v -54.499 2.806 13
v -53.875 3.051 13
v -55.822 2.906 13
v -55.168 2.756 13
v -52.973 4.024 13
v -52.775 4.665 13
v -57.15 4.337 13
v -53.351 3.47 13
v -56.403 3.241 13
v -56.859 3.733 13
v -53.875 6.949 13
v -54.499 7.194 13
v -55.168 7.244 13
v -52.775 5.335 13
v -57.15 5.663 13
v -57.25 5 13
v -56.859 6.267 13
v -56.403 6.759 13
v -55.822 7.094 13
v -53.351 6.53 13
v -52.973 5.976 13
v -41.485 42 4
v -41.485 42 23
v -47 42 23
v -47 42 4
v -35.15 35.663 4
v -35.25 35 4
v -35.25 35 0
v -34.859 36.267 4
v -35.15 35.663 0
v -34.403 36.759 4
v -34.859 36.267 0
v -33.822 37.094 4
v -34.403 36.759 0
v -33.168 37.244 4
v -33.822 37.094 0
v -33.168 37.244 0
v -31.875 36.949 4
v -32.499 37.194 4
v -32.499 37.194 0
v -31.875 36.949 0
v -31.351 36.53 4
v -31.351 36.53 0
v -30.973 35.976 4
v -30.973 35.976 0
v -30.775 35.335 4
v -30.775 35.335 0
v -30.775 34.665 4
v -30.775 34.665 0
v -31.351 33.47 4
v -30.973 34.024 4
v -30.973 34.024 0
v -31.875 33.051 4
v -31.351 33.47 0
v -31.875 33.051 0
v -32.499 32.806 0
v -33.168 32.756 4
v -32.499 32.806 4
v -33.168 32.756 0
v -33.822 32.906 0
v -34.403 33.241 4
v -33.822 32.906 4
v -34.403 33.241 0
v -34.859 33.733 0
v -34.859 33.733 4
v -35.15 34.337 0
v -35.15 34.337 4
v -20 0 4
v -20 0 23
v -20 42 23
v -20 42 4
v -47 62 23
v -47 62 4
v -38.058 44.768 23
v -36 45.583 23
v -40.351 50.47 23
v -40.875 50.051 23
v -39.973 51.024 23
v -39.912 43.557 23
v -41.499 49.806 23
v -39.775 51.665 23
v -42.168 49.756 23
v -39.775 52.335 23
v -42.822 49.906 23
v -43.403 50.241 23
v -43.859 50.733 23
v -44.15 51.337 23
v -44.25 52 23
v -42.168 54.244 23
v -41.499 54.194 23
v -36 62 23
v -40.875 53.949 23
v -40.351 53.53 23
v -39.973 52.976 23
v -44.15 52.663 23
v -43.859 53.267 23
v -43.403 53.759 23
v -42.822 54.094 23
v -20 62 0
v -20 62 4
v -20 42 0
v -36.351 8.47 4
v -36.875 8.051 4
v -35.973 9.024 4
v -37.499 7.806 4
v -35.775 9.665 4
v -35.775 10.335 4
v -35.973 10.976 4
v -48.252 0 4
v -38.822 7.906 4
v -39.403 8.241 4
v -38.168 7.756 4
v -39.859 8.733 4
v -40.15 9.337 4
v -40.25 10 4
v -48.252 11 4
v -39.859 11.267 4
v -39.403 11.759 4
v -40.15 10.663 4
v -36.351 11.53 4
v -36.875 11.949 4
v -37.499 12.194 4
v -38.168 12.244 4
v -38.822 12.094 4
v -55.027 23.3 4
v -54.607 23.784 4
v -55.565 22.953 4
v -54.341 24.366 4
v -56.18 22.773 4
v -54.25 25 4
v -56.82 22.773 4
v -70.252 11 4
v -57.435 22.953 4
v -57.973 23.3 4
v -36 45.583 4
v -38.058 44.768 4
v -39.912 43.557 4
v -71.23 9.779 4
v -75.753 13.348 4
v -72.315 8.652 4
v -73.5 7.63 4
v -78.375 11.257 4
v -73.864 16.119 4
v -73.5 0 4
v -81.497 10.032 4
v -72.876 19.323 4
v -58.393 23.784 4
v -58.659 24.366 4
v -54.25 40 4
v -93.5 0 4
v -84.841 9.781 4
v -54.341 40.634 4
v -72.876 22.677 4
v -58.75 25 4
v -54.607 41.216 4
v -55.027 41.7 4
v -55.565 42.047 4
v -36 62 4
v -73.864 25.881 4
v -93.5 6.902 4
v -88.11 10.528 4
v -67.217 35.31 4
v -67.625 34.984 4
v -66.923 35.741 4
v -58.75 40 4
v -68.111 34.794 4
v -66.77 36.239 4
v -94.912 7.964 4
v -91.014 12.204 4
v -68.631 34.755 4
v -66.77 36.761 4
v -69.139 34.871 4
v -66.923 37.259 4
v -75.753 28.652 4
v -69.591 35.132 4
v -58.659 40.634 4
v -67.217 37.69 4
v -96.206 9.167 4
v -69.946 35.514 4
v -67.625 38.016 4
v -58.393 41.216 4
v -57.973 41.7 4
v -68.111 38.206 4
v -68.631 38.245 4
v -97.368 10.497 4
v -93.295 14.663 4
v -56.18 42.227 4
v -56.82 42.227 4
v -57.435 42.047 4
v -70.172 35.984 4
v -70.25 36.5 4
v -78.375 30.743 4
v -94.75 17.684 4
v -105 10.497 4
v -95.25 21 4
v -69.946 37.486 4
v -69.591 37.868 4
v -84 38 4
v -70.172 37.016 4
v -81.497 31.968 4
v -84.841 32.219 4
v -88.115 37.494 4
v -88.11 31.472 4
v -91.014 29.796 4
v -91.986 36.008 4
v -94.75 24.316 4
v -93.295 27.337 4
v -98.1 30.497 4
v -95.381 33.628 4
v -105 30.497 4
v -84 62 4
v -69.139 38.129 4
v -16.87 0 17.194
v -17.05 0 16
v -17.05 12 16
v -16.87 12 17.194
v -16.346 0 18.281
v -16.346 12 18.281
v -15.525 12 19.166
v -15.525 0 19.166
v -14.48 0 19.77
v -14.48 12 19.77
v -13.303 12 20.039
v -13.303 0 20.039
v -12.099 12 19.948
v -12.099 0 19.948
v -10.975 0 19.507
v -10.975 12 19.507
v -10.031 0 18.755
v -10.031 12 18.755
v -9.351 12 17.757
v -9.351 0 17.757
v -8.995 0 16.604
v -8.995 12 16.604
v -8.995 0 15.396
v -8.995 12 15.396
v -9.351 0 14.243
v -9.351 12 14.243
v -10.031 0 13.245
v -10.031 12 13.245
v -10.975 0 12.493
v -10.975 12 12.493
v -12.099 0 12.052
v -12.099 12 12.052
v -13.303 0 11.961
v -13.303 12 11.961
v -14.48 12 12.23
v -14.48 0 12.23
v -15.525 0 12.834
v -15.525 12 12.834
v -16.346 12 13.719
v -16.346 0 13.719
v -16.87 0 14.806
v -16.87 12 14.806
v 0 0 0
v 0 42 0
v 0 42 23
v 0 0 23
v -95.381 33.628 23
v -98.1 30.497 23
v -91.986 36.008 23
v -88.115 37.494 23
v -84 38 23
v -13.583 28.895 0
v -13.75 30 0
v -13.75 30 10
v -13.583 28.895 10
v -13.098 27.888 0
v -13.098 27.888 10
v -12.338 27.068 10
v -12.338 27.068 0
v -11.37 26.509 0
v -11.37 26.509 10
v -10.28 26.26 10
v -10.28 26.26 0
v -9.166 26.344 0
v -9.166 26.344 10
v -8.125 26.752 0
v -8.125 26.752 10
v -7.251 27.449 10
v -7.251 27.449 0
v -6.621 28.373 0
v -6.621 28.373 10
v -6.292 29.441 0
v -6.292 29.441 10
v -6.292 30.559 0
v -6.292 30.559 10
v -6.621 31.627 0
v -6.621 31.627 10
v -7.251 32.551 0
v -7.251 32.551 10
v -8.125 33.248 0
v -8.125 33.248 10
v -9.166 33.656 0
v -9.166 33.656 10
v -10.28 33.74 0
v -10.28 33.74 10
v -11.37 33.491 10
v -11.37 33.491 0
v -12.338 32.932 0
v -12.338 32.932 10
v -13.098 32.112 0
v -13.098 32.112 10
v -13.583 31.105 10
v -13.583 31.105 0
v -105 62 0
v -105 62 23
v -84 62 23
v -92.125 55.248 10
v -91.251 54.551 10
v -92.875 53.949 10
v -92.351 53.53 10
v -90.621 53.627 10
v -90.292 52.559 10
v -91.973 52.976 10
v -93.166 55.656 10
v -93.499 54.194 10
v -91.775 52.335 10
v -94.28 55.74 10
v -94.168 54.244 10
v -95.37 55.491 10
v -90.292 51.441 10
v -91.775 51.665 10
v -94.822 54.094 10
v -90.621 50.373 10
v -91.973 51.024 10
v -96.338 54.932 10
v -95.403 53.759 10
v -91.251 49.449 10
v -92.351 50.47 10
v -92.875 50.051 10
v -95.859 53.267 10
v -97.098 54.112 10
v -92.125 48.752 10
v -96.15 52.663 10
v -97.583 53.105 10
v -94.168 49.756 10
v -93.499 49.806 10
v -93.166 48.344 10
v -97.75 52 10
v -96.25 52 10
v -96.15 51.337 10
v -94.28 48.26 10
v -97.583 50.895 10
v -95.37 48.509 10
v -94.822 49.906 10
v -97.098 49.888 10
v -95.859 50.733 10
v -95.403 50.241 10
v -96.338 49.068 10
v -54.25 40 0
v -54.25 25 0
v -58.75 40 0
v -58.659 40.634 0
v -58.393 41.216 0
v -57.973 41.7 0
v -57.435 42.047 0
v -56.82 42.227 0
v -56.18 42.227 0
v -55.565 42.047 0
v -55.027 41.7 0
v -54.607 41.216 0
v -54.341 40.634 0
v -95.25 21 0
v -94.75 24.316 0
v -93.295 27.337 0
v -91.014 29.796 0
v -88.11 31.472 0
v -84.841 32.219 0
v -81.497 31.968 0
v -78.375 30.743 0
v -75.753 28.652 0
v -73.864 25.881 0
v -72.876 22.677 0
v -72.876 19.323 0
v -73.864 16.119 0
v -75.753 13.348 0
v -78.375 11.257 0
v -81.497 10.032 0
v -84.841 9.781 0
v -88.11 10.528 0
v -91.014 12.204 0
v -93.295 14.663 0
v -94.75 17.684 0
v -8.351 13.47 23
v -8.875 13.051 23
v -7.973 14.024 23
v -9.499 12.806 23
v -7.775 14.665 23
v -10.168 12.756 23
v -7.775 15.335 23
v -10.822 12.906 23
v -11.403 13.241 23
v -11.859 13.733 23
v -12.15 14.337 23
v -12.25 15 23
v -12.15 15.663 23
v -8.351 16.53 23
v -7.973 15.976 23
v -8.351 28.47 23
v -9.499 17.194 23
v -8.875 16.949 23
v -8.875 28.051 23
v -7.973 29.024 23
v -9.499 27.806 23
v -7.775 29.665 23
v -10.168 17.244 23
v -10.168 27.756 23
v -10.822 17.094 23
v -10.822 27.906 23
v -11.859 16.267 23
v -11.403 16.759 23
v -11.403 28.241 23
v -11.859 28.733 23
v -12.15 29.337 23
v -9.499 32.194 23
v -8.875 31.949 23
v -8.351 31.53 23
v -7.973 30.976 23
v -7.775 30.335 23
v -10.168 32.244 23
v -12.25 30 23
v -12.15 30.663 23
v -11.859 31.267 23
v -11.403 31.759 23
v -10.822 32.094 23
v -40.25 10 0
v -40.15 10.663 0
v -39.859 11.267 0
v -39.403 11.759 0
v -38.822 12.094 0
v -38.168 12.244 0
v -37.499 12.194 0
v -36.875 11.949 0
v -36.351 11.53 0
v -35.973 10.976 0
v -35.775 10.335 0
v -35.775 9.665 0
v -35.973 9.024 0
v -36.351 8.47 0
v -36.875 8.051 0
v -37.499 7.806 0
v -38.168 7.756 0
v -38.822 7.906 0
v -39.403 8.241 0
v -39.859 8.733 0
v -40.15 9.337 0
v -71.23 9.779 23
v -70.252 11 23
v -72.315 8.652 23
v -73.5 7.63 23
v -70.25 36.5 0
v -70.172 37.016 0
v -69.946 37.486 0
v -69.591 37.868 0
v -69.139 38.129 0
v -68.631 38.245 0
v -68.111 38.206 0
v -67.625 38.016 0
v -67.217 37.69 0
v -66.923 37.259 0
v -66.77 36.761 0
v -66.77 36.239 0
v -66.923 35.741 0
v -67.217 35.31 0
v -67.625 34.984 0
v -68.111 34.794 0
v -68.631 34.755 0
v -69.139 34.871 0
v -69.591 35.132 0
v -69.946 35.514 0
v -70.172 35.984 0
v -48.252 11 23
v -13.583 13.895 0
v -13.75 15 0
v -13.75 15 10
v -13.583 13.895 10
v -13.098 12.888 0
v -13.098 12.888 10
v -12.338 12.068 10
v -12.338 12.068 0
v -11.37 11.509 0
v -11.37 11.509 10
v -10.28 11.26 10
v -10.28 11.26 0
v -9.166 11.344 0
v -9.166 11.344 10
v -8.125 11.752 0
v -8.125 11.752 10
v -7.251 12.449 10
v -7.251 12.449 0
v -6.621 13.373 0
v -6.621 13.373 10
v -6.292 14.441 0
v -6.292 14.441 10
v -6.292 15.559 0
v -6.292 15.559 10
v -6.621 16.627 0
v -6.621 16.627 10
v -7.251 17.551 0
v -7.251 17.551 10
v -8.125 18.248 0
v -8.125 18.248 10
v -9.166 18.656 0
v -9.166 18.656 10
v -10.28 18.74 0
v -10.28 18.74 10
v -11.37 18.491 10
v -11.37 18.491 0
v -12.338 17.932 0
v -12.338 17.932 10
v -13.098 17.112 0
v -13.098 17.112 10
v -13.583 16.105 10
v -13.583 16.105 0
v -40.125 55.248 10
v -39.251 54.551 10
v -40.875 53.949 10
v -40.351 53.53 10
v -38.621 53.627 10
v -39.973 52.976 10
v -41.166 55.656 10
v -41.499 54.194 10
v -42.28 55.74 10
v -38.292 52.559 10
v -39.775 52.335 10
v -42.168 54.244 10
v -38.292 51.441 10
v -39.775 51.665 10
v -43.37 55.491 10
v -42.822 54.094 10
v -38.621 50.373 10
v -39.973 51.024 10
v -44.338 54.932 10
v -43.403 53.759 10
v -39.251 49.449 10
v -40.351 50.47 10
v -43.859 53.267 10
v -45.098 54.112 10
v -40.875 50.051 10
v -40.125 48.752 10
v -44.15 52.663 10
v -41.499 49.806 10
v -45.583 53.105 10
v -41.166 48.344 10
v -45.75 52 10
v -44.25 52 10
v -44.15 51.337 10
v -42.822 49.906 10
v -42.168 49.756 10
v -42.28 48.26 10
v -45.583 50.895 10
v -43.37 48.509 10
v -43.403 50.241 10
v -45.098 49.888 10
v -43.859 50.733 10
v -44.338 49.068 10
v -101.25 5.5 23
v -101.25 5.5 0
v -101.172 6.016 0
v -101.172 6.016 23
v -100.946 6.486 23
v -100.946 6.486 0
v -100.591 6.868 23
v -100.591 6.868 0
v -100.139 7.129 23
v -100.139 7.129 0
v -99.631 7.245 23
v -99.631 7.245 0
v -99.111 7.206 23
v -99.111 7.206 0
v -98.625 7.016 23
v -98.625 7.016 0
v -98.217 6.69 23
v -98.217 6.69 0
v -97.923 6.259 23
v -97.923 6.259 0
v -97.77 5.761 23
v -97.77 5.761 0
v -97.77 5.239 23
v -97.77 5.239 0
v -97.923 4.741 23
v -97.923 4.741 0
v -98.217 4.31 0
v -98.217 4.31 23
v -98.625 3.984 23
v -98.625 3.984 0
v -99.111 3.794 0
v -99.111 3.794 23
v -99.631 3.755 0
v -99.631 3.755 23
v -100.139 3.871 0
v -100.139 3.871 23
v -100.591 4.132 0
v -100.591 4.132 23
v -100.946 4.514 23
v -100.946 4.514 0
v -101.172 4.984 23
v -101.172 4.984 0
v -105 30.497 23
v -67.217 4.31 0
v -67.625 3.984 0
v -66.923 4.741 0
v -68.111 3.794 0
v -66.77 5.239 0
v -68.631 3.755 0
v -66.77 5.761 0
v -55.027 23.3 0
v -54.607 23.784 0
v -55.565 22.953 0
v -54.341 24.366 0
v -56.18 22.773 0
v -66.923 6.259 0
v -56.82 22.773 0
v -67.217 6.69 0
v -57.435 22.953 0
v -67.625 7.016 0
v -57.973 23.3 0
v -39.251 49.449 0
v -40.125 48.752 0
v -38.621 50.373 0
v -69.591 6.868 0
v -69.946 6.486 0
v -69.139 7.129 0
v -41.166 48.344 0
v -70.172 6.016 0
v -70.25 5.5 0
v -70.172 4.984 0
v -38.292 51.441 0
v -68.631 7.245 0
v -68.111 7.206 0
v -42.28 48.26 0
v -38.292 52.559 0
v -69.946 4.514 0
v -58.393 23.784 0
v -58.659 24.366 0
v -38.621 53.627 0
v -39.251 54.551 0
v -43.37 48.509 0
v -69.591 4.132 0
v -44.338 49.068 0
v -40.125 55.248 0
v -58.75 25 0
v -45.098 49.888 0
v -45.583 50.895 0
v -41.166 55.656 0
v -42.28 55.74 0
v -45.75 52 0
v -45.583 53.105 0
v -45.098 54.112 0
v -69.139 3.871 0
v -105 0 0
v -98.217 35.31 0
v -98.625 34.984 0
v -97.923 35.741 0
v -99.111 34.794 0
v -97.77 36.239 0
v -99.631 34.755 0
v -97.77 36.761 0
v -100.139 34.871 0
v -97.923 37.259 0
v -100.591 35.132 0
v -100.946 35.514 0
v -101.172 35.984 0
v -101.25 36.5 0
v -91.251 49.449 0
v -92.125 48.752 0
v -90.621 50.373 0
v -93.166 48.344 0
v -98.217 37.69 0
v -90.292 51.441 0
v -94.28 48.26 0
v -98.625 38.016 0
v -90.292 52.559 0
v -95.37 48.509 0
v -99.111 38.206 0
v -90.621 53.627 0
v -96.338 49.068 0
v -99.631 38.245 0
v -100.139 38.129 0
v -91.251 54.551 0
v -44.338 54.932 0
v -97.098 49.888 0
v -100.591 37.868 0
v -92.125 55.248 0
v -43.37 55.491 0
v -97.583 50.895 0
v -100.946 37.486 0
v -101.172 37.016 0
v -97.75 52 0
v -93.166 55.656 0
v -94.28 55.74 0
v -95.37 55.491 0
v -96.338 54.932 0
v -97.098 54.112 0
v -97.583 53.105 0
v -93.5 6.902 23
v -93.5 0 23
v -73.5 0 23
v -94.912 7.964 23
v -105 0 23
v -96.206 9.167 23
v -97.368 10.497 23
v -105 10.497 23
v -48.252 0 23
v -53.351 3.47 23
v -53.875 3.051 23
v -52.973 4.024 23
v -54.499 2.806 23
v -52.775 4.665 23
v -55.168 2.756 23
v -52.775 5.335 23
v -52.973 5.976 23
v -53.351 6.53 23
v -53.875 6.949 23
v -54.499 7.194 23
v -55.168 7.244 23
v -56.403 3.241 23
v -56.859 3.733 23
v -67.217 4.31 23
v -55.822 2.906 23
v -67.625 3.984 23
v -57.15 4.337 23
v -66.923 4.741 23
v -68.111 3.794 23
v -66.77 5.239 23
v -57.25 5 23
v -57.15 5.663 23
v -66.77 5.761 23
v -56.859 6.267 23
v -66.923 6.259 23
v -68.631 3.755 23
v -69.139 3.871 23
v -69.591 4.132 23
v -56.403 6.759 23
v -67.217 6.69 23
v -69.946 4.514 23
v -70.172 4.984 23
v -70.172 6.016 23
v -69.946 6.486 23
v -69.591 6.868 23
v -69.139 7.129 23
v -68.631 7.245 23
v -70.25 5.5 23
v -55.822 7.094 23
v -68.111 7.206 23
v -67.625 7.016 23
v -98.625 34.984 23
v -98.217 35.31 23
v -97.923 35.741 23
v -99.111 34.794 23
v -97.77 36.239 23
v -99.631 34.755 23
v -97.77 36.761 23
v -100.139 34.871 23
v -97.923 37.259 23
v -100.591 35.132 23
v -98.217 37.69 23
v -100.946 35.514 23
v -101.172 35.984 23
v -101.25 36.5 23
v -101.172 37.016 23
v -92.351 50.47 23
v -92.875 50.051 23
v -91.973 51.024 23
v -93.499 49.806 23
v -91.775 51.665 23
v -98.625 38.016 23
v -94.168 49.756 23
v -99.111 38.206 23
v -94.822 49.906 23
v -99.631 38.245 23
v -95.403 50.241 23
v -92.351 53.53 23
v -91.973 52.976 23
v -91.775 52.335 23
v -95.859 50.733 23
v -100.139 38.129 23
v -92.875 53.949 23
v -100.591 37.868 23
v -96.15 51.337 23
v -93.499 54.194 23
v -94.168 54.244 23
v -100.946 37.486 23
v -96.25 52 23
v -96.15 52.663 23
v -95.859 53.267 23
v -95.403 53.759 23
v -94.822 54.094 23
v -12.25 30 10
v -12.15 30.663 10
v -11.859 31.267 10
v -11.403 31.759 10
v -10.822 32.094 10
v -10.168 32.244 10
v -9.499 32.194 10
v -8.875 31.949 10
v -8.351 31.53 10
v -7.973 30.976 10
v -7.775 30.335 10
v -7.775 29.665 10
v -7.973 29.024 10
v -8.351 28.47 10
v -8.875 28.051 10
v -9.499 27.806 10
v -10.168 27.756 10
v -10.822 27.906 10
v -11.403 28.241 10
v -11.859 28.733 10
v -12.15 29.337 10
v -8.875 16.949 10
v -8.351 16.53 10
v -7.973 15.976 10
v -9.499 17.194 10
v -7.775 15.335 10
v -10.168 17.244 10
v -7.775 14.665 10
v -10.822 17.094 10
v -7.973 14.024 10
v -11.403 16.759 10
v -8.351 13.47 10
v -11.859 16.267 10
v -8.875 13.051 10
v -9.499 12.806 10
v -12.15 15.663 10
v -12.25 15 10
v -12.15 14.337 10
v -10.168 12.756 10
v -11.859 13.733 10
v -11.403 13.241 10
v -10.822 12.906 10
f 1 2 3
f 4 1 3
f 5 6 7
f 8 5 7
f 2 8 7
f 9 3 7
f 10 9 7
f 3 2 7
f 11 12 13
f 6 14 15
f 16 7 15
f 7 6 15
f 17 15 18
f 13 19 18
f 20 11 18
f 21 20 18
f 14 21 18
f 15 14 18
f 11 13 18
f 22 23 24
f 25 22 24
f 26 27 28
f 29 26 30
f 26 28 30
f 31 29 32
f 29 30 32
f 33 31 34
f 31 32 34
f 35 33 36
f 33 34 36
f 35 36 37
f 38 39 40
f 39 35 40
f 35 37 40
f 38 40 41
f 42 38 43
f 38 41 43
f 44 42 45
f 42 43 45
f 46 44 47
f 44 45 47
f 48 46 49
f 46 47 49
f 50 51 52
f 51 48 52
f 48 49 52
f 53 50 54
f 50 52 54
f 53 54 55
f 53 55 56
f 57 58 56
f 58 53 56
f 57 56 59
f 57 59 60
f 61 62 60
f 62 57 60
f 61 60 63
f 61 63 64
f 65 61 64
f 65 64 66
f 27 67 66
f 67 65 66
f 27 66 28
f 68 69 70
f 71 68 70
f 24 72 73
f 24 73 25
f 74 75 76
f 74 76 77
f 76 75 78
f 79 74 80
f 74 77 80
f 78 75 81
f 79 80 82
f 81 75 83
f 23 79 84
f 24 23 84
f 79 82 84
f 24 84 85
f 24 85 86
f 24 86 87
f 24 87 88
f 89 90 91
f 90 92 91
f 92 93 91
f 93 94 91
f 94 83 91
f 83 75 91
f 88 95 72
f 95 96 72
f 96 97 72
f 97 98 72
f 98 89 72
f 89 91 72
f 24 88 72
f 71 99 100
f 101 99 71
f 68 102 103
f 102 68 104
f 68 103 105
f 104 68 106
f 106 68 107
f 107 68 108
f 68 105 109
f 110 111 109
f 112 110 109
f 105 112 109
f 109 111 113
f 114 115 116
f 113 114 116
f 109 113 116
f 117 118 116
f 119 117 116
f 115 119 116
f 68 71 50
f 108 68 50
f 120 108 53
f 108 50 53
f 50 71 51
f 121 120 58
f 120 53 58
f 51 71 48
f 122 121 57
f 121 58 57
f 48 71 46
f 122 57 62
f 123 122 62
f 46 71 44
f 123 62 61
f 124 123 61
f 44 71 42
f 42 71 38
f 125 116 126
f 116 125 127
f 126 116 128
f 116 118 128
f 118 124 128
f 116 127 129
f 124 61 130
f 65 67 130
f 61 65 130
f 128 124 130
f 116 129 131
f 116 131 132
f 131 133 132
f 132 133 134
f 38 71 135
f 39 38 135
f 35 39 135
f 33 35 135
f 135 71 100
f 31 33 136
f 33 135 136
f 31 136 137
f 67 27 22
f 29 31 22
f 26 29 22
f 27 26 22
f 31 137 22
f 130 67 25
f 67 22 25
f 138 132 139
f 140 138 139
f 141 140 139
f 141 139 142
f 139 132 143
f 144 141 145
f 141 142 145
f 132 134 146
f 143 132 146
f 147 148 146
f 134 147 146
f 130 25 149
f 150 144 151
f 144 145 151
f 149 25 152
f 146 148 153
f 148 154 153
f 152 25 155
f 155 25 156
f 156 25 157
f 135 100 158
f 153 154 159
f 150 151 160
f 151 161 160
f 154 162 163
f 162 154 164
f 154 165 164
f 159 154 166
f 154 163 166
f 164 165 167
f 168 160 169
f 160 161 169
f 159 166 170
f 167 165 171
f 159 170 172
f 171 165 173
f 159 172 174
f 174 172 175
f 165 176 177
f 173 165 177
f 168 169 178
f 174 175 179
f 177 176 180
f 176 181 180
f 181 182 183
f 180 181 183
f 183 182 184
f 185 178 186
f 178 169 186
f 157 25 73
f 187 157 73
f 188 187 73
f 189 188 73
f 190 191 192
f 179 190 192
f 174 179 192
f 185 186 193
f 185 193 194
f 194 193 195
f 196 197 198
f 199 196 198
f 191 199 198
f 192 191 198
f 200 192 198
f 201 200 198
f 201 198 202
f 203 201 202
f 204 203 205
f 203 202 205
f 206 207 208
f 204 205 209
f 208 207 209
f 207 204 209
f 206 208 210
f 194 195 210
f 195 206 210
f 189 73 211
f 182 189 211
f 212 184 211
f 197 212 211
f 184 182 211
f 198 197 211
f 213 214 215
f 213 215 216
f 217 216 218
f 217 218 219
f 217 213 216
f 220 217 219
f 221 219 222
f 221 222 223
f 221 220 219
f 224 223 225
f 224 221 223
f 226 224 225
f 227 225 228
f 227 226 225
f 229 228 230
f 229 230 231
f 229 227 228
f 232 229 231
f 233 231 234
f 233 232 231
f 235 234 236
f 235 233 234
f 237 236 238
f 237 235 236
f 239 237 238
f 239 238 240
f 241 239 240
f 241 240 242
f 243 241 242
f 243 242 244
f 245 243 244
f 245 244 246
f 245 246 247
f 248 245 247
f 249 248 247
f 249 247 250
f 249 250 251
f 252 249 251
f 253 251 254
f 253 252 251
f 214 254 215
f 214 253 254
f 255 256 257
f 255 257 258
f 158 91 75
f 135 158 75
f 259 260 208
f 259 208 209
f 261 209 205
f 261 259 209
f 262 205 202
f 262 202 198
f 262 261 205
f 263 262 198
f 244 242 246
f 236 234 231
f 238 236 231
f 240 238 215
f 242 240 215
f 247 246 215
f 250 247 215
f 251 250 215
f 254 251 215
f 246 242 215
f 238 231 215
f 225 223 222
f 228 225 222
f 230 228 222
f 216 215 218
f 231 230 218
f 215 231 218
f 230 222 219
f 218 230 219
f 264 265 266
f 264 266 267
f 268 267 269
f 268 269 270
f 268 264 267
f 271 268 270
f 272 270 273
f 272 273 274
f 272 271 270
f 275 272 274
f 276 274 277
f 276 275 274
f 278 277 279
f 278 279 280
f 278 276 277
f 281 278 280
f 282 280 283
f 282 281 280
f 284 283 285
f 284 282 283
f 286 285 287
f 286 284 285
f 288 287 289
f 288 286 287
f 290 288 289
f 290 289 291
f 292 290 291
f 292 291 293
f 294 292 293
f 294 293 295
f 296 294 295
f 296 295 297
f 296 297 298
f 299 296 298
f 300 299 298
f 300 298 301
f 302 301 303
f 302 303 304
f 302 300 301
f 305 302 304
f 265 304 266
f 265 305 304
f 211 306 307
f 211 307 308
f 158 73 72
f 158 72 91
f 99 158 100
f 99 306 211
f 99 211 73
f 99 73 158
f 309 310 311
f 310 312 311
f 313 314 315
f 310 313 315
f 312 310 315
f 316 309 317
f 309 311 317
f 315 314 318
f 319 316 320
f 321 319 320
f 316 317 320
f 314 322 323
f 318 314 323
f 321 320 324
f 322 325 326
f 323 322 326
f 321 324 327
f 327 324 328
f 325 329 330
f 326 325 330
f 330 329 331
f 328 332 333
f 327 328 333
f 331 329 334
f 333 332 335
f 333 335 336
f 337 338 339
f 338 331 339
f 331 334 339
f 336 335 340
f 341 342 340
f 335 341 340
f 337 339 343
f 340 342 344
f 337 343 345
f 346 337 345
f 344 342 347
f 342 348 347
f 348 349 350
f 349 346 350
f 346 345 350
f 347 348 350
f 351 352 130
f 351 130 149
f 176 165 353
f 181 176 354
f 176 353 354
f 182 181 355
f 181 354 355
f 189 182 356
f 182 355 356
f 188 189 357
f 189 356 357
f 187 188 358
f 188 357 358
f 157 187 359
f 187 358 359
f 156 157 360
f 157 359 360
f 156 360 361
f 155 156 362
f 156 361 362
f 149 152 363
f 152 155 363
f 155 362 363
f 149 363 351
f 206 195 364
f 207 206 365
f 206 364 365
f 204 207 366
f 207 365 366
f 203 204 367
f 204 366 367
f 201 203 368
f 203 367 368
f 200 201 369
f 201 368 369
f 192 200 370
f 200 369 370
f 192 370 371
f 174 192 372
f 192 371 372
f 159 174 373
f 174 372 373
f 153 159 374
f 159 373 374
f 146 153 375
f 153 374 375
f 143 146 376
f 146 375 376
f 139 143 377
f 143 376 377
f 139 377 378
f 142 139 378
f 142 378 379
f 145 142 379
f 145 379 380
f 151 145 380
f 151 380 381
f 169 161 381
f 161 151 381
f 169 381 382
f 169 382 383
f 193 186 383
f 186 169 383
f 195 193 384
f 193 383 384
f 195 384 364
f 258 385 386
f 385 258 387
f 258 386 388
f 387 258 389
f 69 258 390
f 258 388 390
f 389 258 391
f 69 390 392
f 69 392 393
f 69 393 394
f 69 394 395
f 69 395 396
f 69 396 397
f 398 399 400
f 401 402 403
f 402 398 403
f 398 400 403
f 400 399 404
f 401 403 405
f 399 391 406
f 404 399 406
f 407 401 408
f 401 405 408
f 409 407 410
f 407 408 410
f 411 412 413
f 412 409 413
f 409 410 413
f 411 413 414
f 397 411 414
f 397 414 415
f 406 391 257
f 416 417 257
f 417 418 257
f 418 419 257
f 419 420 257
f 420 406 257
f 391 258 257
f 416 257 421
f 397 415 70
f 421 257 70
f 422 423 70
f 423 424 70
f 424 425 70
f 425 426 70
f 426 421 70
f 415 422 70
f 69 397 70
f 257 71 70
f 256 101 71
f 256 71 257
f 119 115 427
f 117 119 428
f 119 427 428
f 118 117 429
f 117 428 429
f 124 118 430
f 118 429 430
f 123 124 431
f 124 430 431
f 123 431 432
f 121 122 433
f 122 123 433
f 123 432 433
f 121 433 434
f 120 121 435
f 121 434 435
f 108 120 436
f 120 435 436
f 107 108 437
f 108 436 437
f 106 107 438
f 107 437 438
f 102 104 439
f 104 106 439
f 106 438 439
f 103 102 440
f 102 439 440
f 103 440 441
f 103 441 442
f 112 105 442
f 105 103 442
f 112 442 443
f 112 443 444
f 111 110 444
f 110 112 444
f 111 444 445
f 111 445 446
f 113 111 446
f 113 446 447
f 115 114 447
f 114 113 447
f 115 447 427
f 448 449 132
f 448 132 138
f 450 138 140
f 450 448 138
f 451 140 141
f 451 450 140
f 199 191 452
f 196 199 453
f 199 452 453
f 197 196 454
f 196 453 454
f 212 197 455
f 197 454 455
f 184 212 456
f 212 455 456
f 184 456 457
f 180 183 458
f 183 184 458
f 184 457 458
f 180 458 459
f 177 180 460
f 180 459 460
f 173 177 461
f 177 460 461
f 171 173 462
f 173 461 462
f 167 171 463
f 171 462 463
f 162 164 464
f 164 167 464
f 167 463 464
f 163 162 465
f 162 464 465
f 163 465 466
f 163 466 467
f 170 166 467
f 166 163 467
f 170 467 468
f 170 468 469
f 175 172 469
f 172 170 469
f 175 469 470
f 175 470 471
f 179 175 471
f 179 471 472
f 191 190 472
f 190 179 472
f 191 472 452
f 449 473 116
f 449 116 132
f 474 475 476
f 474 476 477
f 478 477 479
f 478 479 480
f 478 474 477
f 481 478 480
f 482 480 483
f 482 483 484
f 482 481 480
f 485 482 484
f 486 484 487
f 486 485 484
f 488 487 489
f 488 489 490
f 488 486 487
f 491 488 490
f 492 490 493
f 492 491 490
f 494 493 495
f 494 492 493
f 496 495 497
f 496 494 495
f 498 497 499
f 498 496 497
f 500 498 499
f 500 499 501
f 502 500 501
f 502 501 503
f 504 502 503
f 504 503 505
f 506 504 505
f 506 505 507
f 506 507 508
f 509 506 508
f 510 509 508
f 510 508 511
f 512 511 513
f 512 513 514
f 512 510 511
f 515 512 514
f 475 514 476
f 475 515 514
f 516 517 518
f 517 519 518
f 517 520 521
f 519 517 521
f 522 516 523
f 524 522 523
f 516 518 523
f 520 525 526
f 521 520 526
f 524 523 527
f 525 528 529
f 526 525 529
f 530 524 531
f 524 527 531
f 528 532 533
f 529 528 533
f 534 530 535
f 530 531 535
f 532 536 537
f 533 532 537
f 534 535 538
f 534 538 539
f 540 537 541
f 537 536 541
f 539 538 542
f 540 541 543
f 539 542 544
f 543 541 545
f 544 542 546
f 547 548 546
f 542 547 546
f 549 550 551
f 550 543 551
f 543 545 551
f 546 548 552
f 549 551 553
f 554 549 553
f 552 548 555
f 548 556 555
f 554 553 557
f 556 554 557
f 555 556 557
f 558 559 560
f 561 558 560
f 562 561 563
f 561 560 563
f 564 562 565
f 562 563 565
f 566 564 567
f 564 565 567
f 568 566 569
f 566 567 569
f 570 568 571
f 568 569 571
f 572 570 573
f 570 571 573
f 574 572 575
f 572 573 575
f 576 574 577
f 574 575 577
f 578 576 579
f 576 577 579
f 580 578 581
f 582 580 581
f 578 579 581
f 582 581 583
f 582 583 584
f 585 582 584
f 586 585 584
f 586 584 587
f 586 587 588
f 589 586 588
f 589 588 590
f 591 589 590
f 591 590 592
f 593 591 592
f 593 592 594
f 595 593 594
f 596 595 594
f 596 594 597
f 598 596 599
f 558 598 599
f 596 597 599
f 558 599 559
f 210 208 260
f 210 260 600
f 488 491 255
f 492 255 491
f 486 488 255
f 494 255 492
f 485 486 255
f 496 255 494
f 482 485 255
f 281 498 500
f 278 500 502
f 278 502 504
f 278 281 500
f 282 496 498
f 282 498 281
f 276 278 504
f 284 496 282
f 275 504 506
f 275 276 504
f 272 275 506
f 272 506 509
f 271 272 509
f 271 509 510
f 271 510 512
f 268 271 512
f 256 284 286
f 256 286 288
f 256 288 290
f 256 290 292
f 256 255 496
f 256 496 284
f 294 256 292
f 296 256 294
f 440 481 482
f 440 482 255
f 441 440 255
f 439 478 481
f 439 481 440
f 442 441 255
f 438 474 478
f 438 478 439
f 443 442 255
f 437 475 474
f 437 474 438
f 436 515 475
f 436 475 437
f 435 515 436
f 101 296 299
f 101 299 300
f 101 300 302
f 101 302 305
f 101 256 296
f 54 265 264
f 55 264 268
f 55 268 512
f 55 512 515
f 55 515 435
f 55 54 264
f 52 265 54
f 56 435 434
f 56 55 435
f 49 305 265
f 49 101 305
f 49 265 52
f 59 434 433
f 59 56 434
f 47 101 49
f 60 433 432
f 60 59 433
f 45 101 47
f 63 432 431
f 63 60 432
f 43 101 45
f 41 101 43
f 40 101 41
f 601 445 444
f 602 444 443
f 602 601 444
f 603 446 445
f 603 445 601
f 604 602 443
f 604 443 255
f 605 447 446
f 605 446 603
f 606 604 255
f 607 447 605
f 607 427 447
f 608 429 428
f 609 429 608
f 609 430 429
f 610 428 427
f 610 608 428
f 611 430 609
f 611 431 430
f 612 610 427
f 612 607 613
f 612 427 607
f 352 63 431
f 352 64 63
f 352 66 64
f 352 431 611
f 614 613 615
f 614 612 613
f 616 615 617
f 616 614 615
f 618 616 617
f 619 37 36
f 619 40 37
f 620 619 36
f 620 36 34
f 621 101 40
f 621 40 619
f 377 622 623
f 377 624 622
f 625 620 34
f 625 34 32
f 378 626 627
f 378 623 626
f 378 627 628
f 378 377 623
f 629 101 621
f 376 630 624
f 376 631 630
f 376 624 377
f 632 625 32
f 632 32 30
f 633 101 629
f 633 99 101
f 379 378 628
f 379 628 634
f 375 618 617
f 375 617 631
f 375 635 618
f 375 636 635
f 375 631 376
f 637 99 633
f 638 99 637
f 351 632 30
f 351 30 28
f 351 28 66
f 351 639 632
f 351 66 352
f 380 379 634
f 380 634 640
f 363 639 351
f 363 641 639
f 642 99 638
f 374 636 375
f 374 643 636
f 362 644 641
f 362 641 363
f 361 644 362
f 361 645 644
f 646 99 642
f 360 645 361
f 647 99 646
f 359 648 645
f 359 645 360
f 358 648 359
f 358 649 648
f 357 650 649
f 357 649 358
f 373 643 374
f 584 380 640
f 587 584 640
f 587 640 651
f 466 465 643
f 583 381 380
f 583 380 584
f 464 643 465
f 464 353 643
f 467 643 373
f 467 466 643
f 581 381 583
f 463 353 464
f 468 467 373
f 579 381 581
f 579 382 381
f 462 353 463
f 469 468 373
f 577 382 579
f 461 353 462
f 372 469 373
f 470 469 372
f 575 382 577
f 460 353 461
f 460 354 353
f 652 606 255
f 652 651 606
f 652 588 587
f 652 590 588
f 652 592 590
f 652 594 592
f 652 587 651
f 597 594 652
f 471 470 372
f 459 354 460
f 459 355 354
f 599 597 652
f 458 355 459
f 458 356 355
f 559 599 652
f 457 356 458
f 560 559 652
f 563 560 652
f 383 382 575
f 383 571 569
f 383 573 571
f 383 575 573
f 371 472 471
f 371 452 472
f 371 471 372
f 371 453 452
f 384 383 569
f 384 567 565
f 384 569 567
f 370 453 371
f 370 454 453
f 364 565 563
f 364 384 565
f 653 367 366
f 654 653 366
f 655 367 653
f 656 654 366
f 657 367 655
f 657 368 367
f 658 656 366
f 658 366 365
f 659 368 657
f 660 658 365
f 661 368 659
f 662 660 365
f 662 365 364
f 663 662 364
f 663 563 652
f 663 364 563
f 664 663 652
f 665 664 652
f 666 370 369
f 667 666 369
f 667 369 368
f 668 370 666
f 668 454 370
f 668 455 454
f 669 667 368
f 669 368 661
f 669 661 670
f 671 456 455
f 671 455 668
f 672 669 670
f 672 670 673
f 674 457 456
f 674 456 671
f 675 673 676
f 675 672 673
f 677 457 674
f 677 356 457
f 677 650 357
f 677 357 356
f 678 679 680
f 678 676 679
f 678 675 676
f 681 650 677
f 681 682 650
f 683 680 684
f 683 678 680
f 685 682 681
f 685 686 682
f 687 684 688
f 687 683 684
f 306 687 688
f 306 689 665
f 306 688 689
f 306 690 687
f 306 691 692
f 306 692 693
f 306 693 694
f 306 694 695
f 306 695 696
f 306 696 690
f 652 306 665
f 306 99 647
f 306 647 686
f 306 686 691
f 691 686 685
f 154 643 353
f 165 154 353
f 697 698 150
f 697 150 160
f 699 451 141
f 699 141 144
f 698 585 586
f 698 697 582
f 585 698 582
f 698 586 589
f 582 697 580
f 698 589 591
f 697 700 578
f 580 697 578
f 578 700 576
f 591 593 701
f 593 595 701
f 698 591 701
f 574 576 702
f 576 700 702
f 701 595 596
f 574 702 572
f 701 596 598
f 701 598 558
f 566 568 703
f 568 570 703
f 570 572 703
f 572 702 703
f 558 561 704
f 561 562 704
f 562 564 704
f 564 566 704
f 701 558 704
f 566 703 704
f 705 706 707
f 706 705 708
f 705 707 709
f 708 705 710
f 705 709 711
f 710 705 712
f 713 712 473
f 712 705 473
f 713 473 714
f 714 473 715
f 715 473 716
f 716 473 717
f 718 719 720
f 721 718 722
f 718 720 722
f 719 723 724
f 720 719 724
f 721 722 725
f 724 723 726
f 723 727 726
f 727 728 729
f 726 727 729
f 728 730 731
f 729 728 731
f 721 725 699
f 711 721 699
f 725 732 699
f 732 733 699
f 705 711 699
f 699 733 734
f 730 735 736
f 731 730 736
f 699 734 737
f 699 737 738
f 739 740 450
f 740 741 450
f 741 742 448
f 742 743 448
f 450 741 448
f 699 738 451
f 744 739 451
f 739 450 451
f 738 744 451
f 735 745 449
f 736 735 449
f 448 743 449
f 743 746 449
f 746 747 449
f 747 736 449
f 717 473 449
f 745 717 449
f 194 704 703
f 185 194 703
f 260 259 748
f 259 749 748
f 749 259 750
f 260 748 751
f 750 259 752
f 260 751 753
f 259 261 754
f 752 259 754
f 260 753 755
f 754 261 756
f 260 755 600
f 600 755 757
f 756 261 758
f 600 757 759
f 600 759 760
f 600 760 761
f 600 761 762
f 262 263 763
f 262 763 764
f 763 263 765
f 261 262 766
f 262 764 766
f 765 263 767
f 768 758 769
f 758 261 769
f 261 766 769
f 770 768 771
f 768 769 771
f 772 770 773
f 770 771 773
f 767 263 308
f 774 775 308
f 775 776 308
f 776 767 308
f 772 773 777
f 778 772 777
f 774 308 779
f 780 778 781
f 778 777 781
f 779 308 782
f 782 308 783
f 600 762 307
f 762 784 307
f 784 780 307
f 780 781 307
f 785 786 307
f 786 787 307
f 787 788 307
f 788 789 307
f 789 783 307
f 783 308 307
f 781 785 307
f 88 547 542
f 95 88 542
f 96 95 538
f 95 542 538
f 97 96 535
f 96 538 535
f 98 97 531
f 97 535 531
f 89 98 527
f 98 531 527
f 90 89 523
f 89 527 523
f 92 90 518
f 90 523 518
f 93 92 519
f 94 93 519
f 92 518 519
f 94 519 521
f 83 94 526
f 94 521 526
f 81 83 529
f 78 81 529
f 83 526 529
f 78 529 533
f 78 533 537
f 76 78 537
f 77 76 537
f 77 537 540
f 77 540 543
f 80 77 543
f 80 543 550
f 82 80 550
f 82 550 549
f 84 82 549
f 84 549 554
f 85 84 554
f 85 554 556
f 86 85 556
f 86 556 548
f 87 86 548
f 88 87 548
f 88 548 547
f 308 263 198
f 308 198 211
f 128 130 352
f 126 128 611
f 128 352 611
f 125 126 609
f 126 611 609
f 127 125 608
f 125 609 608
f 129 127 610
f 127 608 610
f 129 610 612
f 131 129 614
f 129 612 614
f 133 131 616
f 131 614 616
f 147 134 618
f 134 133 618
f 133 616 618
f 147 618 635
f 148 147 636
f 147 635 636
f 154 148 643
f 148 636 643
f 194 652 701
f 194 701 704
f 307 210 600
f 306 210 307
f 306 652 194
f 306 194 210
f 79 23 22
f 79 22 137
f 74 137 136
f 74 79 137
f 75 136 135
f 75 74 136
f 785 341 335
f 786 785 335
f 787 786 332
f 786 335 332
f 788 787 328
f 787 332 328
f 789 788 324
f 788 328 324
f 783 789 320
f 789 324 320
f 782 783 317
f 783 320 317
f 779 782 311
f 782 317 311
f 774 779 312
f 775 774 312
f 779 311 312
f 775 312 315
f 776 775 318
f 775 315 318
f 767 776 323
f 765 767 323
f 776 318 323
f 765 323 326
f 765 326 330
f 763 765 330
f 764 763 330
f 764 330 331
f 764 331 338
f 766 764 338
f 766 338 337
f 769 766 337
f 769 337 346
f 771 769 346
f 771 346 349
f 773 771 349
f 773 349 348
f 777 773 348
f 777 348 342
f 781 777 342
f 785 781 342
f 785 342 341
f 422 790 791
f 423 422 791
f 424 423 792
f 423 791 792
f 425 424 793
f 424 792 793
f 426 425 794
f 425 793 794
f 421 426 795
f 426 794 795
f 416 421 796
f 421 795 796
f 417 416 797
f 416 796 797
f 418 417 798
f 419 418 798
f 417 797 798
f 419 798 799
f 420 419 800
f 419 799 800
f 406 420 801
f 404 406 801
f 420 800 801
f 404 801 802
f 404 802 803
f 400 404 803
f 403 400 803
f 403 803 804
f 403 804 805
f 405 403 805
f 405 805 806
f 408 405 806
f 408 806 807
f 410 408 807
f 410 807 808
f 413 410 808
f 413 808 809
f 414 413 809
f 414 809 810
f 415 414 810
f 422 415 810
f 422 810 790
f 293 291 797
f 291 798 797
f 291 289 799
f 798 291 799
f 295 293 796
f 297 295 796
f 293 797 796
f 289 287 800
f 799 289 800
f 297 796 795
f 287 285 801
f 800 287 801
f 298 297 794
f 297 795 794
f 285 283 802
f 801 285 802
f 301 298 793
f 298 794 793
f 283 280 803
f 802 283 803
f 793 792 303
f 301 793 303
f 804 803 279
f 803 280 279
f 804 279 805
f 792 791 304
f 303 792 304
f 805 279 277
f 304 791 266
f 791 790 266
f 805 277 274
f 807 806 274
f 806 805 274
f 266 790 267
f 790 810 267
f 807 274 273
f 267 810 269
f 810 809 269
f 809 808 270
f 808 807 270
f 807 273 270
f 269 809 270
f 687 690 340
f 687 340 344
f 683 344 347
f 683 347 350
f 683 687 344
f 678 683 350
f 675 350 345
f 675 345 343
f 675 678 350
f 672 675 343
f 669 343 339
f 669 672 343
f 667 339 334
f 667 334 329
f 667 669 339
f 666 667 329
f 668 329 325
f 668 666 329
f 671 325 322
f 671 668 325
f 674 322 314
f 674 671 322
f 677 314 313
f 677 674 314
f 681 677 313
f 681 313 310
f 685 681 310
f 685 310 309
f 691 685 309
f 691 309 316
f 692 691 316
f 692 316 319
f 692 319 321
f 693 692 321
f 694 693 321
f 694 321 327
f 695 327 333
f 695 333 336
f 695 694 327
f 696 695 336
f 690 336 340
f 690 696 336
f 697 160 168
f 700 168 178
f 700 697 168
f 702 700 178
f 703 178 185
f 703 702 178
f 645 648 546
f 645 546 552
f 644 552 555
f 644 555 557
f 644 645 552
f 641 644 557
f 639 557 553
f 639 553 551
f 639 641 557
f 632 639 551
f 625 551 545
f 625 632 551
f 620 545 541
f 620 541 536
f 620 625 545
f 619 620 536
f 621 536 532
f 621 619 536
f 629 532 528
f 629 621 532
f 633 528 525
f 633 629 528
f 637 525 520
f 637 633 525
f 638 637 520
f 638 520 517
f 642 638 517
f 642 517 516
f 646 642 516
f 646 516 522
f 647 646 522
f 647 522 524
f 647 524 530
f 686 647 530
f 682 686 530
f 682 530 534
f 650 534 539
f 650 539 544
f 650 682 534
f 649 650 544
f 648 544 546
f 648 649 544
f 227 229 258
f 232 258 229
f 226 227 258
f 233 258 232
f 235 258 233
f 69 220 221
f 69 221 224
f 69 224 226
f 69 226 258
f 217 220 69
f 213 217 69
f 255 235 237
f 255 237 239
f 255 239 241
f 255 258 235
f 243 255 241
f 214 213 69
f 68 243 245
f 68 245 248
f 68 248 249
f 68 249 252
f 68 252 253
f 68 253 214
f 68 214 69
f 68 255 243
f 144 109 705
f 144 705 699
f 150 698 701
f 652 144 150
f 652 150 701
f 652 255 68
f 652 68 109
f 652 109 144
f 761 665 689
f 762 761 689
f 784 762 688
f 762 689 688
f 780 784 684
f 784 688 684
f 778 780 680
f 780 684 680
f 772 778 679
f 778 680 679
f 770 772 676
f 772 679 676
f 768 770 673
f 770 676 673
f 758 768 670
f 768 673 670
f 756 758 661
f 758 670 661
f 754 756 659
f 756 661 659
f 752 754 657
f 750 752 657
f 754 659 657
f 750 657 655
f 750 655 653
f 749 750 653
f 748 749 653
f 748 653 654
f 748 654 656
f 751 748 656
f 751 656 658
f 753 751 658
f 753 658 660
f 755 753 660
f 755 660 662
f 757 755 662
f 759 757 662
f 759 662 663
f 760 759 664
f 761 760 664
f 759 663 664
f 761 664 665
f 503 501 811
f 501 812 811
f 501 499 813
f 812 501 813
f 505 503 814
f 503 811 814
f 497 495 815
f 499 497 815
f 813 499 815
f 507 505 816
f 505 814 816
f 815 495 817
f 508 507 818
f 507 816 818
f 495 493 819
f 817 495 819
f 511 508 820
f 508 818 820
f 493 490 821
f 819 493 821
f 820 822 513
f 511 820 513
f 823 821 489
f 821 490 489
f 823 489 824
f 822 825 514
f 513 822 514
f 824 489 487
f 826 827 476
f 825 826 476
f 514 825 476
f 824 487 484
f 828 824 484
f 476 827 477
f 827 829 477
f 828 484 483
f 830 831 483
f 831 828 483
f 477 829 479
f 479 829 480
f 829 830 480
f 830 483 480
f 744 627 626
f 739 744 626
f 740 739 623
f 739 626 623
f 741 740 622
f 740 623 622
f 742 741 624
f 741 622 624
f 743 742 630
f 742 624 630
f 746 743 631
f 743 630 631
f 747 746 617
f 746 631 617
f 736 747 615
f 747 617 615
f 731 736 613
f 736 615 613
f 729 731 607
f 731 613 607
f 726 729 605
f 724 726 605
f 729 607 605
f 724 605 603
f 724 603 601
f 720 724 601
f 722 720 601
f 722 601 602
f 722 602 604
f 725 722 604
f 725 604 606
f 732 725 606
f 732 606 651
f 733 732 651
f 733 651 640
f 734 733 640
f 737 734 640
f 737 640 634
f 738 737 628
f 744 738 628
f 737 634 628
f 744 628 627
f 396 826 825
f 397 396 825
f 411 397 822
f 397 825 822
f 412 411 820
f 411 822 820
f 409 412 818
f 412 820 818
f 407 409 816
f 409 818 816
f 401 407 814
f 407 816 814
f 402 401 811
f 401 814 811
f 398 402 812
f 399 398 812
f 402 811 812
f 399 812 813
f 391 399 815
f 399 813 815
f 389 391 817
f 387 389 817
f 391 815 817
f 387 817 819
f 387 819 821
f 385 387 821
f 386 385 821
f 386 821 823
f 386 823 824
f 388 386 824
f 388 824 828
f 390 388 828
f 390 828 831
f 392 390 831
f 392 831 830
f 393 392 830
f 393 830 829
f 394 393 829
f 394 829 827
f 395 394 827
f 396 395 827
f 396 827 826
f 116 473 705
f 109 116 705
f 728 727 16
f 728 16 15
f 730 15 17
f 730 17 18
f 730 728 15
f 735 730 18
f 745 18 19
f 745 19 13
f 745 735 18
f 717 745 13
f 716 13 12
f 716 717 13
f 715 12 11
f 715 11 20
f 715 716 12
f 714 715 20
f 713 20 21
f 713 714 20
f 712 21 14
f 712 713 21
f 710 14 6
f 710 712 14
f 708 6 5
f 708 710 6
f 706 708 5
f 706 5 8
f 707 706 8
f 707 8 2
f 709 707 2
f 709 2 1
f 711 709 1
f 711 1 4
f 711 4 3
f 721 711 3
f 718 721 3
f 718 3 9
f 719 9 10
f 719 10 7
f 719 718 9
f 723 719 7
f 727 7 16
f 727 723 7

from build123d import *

# Parameters (mm, degrees)
SKETCH_R        = 2.25
SKETCH_R_2      = 11.25
SKETCH_R_3      = 1.75
PAD_DEPTH       = 23
POCKET_DEPTH    = 19
SKETCH004_R     = 2.25
POCKET003_DEPTH = 10
SKETCH005_R     = 4.05
POCKET004_DEPTH = 12
SKETCH006_R     = 3.75
POCKET005_DEPTH = 10


with BuildPart() as pocket005:
    # Sketch → Pad (new body)
    with BuildSketch(Plane.XY):
        Polygon((0, 0), (105, 0), (105, 62), (20, 62), (20, 42), (0, 42), align=None)
        with Locations((38, 10)):
            Circle(SKETCH_R, mode=Mode.SUBTRACT)
        with Locations((33, 35)):
            Circle(SKETCH_R, mode=Mode.SUBTRACT)
        with Locations((84, 21)):
            Circle(SKETCH_R_2, mode=Mode.SUBTRACT)
        with Locations((68.5, 36.5)):
            Circle(SKETCH_R_3, mode=Mode.SUBTRACT)
        with Locations((99.5, 36.5)):
            Circle(SKETCH_R_3, mode=Mode.SUBTRACT)
        with Locations((68.5, 5.5)):
            Circle(SKETCH_R_3, mode=Mode.SUBTRACT)
        with Locations((99.5, 5.5)):
            Circle(SKETCH_R_3, mode=Mode.SUBTRACT)
        with Locations((10, 30)):
            Circle(SKETCH_R, mode=Mode.SUBTRACT)
        with Locations((10, 15)):
            Circle(SKETCH_R, mode=Mode.SUBTRACT)
        with Locations((42, 52)):
            Circle(SKETCH_R, mode=Mode.SUBTRACT)
        with Locations((94, 52)):
            Circle(SKETCH_R, mode=Mode.SUBTRACT)
        with BuildLine():
            Line((58.75, 25), (58.75, 39.999999))
            ThreePointArc((58.75, 39.999999), (56.5, 42.25), (54.25, 39.999998))
            Line((54.25, 25.000001), (54.25, 39.999998))
            ThreePointArc((54.25, 25.000001), (56.5, 22.75), (58.75, 25))
        make_face(mode=Mode.SUBTRACT)
    extrude(amount=PAD_DEPTH)

    # Sketch001 → Pocket (cut)
    with BuildSketch(Plane.XY.offset(23)):
        with BuildLine():
            ThreePointArc((41.485277, 42), (39.015593, 44.209375), (35.999996, 45.583005))
            Line((35.999996, 67), (35.999996, 45.583005))
            Line((20, 67), (35.999996, 67))
            Line((20, -1), (20, 67))
            Line((20, -1), (48.252269, -1))
            Line((48.252269, 11), (48.252269, -1))
            Line((48.252269, 11), (70.252269, 11))
            ThreePointArc((70.252269, 11), (71.759618, 9.202833), (73.499996, 7.630258))
            Line((73.499996, 7.630258), (73.499996, -1))
            Line((73.499996, -1), (93.499996, -1))
            Line((93.499996, -1), (93.499996, 6.902128))
            ThreePointArc((93.499996, 6.902128), (95.574295, 8.548671), (97.367695, 10.497399))
            Line((105.499996, 10.497399), (97.367695, 10.497399))
            Line((105.499996, 30.497399), (105.499996, 10.497399))
            Line((98.099621, 30.497399), (105.499996, 30.497399))
            ThreePointArc((98.099621, 30.497399), (91.98574, 36.007594), (83.999996, 38))
            Line((83.999996, 38), (83.999996, 67))
            Line((83.999996, 67), (46.999996, 67))
            Line((46.999996, 67), (46.999996, 42))
            Line((41.485277, 42), (46.999996, 42))
        make_face()
    extrude(amount=-POCKET_DEPTH, mode=Mode.SUBTRACT)

    # Sketch004 → Pocket003 (cut)
    with BuildSketch(Plane.XY.offset(23)):
        with Locations((55, 5)):
            Circle(SKETCH004_R)
    extrude(amount=-POCKET003_DEPTH, mode=Mode.SUBTRACT)

    # Sketch005 → Pocket004 (cut)
    with BuildSketch(Plane.XZ):
        with Locations((13, 16)):
            Circle(SKETCH005_R)
    extrude(amount=-POCKET004_DEPTH, mode=Mode.SUBTRACT)

    # Sketch006 → Pocket005 (cut)
    with BuildSketch(Plane(origin=(0, 0, 0), x_dir=(1, 0, 0), z_dir=(0, 0, -1))):
        with Locations((10, -15)):
            Circle(SKETCH006_R)
        with Locations((10, -30)):
            Circle(SKETCH006_R)
        with Locations((42, -52)):
            Circle(SKETCH006_R)
        with Locations((94, -52)):
            Circle(SKETCH006_R)
    extrude(amount=-POCKET005_DEPTH, mode=Mode.SUBTRACT)


with BuildPart() as part_mirroring:
    # Part__Mirroring: instance of Pocket005
    add(pocket005.part.mirror(Plane(origin=(0, 0, 0), x_dir=(0, -1, 0), z_dir=(1, 0, 0))))


solid = part_mirroring.part
